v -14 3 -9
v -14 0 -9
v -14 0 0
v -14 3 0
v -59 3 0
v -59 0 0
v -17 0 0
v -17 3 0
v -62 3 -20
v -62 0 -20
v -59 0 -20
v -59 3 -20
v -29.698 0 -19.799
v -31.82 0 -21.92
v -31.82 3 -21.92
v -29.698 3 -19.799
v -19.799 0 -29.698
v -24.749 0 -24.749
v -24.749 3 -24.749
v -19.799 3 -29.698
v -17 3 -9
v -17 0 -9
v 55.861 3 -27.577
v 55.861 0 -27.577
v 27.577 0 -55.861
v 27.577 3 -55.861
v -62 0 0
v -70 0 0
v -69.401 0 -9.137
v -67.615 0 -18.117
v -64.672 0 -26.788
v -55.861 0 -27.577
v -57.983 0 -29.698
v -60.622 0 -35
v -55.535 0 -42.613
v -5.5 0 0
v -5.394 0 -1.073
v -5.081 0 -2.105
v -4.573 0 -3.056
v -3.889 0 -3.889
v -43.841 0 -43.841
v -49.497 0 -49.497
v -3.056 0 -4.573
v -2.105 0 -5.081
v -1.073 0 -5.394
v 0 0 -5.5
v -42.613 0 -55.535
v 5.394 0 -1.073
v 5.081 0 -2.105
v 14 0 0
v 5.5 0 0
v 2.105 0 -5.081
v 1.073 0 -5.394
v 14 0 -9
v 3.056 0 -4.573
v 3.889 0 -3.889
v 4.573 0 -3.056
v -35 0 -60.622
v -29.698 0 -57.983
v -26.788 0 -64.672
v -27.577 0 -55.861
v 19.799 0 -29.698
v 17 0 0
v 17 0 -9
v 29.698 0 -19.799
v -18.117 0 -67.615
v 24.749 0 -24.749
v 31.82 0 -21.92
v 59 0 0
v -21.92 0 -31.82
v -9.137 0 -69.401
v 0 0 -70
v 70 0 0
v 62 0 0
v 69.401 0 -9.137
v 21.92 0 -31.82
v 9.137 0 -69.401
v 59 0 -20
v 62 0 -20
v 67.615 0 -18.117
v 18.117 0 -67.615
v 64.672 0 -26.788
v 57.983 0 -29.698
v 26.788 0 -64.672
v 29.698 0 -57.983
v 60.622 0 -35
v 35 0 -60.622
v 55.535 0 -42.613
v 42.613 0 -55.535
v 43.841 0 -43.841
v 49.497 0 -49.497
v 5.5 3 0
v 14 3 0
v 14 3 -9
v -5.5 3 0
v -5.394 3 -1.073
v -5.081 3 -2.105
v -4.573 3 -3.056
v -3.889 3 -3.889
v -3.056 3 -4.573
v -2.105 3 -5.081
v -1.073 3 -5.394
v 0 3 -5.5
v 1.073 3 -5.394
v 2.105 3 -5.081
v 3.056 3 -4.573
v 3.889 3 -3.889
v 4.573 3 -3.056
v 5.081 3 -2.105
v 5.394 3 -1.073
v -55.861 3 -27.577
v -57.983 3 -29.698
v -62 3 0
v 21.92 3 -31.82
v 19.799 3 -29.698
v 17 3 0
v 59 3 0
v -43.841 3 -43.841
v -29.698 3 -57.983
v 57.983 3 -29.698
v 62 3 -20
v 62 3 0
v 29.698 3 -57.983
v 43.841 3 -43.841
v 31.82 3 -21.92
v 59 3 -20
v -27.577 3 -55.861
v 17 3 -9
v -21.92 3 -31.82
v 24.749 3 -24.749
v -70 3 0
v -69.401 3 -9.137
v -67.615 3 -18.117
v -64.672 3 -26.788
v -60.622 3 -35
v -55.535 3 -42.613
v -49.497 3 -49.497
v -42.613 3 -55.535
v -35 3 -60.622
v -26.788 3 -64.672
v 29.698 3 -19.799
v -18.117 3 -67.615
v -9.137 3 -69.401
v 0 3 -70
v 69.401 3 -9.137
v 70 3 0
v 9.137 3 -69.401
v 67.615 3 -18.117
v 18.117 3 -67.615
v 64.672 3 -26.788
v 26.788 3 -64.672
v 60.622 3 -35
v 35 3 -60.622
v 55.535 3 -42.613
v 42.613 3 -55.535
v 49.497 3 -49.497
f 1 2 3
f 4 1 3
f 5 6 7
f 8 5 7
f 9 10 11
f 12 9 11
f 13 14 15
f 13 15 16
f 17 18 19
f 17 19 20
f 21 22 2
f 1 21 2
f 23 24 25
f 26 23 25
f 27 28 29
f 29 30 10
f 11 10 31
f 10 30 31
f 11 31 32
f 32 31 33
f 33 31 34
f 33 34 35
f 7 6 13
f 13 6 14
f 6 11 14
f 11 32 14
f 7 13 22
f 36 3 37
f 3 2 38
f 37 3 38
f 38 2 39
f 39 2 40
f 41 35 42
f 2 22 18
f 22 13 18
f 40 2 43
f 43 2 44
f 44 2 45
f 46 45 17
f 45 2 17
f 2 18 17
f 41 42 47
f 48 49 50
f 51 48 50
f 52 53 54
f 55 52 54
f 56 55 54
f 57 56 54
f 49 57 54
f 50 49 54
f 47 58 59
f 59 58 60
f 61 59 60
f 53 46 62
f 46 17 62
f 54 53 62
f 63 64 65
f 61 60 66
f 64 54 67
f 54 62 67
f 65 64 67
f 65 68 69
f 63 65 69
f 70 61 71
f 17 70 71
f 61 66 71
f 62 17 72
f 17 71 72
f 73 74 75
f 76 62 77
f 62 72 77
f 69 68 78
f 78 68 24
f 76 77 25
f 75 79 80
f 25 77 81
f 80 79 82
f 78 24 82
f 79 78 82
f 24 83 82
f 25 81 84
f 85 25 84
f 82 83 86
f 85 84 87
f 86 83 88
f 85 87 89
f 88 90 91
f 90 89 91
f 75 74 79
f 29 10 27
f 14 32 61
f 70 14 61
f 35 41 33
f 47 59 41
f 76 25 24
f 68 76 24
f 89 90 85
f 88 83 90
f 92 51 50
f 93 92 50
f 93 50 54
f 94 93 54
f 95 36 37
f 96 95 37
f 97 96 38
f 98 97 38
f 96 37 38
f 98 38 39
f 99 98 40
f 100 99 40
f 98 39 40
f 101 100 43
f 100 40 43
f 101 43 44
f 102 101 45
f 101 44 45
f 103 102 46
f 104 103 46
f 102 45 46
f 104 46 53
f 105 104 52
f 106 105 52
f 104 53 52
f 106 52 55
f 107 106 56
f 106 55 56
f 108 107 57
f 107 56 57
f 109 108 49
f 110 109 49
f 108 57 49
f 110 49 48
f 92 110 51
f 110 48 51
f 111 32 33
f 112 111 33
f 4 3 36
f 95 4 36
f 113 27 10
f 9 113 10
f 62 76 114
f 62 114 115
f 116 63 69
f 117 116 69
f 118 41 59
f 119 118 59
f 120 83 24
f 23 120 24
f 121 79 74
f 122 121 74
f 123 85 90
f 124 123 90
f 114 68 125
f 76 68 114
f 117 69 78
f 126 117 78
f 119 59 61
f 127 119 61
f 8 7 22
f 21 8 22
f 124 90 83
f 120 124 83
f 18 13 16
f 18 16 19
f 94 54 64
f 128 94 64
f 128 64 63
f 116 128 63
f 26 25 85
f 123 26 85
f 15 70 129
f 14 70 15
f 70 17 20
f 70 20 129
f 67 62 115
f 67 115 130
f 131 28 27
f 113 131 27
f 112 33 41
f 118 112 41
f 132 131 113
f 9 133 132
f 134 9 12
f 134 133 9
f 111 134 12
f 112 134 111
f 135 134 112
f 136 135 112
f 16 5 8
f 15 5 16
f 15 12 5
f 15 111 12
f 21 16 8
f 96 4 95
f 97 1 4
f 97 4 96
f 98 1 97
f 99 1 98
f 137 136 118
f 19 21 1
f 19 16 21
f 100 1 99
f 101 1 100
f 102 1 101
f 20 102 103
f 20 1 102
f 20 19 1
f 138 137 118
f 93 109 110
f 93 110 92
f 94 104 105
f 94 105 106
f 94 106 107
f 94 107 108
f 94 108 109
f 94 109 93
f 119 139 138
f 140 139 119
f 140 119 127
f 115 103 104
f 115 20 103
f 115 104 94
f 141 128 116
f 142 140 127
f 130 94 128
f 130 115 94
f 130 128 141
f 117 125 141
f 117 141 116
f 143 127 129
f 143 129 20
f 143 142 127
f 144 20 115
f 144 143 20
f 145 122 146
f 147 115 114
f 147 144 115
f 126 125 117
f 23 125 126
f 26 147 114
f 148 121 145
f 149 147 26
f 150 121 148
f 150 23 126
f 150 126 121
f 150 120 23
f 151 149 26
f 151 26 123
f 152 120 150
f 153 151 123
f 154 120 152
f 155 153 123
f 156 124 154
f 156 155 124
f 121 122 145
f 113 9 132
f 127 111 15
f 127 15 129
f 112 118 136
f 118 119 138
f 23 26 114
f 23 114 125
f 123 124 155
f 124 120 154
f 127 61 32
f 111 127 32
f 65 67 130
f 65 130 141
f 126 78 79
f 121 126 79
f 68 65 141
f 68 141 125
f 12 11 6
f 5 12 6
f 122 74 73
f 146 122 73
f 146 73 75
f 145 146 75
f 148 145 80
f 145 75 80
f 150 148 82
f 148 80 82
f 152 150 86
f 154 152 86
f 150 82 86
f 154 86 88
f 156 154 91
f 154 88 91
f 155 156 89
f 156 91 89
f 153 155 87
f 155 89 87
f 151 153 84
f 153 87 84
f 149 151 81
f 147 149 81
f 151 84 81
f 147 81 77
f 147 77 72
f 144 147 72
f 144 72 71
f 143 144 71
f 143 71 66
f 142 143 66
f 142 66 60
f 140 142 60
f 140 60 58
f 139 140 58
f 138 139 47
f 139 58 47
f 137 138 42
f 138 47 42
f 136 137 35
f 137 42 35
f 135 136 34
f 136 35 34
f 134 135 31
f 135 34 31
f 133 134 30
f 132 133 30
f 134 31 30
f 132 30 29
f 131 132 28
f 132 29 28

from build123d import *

# Parameters (mm, degrees)
SALIENTE_EXTRUIR1_DEPTH = 3


with BuildPart() as part:
    # Croquis1 → Saliente-Extruir1 (new body)
    with BuildSketch(Plane(origin=(0, 0, 0), x_dir=(1, 0, 0), z_dir=(0, 1, 0))):
        with BuildLine():
            Line((-59, 0), (-17, 0))
            Line((-17, 0), (-17, 9))
            Line((-17, 9), (-14, 9))
            Line((-14, 9), (-14, 0))
            Line((-14, 0), (-5.5, 0))
            ThreePointArc((-5.5, 0), (0, 5.5), (5.5, 0))
            Line((5.5, 0), (14, 0))
            Line((14, 0), (14, 9))
            Line((14, 9), (17, 9))
            Line((17, 9), (17, 0))
            Line((17, 0), (59, 0))
            Line((59, 0), (59, 20))
            Line((59, 20), (62, 20))
            Line((62, 20), (62, 0))
            Line((62, 0), (70, 0))
            ThreePointArc((70, 0), (0, 70), (-70, 0))
            Line((-70, 0), (-62, 0))
            Line((-62, 0), (-62, 20))
            Line((-62, 20), (-59, 20))
            Line((-59, 20), (-59, 0))
        make_face()
        Polygon((24.748737342, 24.748737342), (29.69848481, 19.798989873), (31.819805153, 21.920310217), (21.920310217, 31.819805153), (19.798989873, 29.69848481), align=None, mode=Mode.SUBTRACT)
        Polygon((-24.748737342, 24.748737342), (-19.798989873, 29.69848481), (-21.920310217, 31.819805153), (-31.819805153, 21.920310217), (-29.69848481, 19.798989873), align=None, mode=Mode.SUBTRACT)
        Polygon((55.861435714, 27.577164466), (27.577164466, 55.861435714), (29.69848481, 57.982756057), (43.840620434, 43.840620434), (57.982756057, 29.69848481), align=None, mode=Mode.SUBTRACT)
        Polygon((-27.577164466, 55.861435714), (-55.861435714, 27.577164466), (-57.982756057, 29.69848481), (-43.840620434, 43.840620434), (-29.69848481, 57.982756057), align=None, mode=Mode.SUBTRACT)
    extrude(amount=SALIENTE_EXTRUIR1_DEPTH)


solid = part.part
